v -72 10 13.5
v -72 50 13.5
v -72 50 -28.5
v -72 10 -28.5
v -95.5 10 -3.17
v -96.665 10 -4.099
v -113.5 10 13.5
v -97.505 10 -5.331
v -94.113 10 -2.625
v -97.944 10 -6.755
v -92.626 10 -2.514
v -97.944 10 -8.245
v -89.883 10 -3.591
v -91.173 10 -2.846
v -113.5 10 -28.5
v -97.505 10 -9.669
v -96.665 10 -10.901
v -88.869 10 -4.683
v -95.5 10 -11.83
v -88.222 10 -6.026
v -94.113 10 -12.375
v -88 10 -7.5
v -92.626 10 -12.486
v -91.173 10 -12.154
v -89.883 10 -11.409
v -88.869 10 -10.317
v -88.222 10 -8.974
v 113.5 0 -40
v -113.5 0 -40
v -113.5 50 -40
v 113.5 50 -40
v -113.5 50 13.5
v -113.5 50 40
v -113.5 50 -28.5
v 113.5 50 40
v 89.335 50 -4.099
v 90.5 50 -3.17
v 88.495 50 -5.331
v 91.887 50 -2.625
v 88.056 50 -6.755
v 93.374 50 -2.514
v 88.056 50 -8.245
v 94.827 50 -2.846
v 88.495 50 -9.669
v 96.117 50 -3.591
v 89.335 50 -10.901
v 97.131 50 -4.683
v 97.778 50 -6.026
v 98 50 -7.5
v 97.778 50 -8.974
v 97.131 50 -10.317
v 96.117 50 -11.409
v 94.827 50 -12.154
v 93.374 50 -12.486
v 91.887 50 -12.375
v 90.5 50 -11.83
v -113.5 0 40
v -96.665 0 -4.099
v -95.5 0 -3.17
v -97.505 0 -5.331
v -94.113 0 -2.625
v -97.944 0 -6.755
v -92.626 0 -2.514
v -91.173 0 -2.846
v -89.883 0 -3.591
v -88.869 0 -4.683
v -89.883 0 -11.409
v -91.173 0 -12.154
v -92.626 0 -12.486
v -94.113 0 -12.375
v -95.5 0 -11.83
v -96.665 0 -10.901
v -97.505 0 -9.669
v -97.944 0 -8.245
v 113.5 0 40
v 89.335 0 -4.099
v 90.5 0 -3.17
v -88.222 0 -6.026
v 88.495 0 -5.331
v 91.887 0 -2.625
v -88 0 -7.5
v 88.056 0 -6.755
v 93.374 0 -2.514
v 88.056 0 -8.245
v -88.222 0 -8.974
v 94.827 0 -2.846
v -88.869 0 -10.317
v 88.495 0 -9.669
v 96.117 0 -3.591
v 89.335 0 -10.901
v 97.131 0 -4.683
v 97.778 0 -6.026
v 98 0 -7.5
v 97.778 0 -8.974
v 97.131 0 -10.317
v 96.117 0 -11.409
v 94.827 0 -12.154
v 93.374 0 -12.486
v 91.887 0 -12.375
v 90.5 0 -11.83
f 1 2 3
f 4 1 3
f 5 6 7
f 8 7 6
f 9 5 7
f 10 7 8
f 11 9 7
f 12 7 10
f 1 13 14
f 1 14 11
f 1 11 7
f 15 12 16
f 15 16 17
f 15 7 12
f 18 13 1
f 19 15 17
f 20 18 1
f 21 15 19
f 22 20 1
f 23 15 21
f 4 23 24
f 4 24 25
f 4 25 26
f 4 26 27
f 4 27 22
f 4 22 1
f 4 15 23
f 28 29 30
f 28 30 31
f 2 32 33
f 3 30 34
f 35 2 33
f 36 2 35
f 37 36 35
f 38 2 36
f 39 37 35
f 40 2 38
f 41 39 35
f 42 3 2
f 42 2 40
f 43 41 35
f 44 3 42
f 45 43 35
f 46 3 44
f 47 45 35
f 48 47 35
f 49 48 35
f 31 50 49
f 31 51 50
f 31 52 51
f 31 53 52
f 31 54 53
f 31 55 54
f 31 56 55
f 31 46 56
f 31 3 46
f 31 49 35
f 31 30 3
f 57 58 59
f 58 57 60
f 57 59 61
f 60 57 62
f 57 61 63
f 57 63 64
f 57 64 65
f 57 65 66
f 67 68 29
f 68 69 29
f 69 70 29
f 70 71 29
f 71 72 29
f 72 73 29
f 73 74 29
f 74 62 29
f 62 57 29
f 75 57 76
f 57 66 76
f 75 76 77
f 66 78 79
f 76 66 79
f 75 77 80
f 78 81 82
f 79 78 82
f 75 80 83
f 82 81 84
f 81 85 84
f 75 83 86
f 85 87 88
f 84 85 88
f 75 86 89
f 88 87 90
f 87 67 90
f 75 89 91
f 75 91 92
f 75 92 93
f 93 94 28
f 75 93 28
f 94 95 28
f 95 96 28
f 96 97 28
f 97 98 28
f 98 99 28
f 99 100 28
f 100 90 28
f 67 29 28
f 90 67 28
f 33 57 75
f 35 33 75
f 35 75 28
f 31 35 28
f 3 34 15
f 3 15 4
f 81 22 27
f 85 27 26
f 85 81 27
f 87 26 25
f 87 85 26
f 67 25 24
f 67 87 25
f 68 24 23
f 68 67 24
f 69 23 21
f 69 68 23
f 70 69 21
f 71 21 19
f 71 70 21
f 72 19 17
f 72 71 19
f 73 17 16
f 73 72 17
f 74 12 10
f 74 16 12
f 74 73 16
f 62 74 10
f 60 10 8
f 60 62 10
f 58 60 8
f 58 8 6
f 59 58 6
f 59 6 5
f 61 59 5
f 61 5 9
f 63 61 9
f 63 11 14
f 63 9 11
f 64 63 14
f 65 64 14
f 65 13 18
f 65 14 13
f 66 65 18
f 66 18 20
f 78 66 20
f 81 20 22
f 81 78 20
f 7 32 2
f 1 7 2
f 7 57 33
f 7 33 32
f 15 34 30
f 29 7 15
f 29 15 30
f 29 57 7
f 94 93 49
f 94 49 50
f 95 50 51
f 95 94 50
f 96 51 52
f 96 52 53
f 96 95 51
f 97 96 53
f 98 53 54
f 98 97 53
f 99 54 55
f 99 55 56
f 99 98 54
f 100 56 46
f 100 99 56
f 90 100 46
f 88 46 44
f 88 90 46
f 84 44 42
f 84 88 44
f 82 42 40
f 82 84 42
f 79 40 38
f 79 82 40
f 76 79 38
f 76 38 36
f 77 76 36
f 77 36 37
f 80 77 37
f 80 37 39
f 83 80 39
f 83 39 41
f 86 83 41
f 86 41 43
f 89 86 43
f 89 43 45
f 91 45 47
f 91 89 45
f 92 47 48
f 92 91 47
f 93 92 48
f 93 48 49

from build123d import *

# Parameters (mm, degrees)
SKETCH1_W           = 227
SKETCH1_H           = 80
SKETCH1_R           = 5
BOSS_EXTRUDE1_DEPTH = 50
SKETCH2_W           = 42
SKETCH2_H           = 42
CUT_EXTRUDE1_DEPTH  = 40


with BuildPart() as part:
    # Sketch1 → Boss-Extrude1 (new body)
    with BuildSketch(Plane(origin=(0, 0, 0), x_dir=(1, 0, 0), z_dir=(0, 1, 0))):
        Rectangle(SKETCH1_W, SKETCH1_H)
        with Locations((-93, 7.5)):
            Circle(SKETCH1_R, mode=Mode.SUBTRACT)
        with Locations((93, 7.5)):
            Circle(SKETCH1_R, mode=Mode.SUBTRACT)
    extrude(amount=BOSS_EXTRUDE1_DEPTH)

    # Sketch2 → Cut-Extrude1 (cut)
    with BuildSketch(Plane(origin=(0, 50, 0), x_dir=(1, 0, 0), z_dir=(0, 1, 0))):
        with Locations((-93, 7.5)):
            Rectangle(SKETCH2_W, SKETCH2_H)
    extrude(amount=-CUT_EXTRUDE1_DEPTH, mode=Mode.SUBTRACT)


solid = part.part
